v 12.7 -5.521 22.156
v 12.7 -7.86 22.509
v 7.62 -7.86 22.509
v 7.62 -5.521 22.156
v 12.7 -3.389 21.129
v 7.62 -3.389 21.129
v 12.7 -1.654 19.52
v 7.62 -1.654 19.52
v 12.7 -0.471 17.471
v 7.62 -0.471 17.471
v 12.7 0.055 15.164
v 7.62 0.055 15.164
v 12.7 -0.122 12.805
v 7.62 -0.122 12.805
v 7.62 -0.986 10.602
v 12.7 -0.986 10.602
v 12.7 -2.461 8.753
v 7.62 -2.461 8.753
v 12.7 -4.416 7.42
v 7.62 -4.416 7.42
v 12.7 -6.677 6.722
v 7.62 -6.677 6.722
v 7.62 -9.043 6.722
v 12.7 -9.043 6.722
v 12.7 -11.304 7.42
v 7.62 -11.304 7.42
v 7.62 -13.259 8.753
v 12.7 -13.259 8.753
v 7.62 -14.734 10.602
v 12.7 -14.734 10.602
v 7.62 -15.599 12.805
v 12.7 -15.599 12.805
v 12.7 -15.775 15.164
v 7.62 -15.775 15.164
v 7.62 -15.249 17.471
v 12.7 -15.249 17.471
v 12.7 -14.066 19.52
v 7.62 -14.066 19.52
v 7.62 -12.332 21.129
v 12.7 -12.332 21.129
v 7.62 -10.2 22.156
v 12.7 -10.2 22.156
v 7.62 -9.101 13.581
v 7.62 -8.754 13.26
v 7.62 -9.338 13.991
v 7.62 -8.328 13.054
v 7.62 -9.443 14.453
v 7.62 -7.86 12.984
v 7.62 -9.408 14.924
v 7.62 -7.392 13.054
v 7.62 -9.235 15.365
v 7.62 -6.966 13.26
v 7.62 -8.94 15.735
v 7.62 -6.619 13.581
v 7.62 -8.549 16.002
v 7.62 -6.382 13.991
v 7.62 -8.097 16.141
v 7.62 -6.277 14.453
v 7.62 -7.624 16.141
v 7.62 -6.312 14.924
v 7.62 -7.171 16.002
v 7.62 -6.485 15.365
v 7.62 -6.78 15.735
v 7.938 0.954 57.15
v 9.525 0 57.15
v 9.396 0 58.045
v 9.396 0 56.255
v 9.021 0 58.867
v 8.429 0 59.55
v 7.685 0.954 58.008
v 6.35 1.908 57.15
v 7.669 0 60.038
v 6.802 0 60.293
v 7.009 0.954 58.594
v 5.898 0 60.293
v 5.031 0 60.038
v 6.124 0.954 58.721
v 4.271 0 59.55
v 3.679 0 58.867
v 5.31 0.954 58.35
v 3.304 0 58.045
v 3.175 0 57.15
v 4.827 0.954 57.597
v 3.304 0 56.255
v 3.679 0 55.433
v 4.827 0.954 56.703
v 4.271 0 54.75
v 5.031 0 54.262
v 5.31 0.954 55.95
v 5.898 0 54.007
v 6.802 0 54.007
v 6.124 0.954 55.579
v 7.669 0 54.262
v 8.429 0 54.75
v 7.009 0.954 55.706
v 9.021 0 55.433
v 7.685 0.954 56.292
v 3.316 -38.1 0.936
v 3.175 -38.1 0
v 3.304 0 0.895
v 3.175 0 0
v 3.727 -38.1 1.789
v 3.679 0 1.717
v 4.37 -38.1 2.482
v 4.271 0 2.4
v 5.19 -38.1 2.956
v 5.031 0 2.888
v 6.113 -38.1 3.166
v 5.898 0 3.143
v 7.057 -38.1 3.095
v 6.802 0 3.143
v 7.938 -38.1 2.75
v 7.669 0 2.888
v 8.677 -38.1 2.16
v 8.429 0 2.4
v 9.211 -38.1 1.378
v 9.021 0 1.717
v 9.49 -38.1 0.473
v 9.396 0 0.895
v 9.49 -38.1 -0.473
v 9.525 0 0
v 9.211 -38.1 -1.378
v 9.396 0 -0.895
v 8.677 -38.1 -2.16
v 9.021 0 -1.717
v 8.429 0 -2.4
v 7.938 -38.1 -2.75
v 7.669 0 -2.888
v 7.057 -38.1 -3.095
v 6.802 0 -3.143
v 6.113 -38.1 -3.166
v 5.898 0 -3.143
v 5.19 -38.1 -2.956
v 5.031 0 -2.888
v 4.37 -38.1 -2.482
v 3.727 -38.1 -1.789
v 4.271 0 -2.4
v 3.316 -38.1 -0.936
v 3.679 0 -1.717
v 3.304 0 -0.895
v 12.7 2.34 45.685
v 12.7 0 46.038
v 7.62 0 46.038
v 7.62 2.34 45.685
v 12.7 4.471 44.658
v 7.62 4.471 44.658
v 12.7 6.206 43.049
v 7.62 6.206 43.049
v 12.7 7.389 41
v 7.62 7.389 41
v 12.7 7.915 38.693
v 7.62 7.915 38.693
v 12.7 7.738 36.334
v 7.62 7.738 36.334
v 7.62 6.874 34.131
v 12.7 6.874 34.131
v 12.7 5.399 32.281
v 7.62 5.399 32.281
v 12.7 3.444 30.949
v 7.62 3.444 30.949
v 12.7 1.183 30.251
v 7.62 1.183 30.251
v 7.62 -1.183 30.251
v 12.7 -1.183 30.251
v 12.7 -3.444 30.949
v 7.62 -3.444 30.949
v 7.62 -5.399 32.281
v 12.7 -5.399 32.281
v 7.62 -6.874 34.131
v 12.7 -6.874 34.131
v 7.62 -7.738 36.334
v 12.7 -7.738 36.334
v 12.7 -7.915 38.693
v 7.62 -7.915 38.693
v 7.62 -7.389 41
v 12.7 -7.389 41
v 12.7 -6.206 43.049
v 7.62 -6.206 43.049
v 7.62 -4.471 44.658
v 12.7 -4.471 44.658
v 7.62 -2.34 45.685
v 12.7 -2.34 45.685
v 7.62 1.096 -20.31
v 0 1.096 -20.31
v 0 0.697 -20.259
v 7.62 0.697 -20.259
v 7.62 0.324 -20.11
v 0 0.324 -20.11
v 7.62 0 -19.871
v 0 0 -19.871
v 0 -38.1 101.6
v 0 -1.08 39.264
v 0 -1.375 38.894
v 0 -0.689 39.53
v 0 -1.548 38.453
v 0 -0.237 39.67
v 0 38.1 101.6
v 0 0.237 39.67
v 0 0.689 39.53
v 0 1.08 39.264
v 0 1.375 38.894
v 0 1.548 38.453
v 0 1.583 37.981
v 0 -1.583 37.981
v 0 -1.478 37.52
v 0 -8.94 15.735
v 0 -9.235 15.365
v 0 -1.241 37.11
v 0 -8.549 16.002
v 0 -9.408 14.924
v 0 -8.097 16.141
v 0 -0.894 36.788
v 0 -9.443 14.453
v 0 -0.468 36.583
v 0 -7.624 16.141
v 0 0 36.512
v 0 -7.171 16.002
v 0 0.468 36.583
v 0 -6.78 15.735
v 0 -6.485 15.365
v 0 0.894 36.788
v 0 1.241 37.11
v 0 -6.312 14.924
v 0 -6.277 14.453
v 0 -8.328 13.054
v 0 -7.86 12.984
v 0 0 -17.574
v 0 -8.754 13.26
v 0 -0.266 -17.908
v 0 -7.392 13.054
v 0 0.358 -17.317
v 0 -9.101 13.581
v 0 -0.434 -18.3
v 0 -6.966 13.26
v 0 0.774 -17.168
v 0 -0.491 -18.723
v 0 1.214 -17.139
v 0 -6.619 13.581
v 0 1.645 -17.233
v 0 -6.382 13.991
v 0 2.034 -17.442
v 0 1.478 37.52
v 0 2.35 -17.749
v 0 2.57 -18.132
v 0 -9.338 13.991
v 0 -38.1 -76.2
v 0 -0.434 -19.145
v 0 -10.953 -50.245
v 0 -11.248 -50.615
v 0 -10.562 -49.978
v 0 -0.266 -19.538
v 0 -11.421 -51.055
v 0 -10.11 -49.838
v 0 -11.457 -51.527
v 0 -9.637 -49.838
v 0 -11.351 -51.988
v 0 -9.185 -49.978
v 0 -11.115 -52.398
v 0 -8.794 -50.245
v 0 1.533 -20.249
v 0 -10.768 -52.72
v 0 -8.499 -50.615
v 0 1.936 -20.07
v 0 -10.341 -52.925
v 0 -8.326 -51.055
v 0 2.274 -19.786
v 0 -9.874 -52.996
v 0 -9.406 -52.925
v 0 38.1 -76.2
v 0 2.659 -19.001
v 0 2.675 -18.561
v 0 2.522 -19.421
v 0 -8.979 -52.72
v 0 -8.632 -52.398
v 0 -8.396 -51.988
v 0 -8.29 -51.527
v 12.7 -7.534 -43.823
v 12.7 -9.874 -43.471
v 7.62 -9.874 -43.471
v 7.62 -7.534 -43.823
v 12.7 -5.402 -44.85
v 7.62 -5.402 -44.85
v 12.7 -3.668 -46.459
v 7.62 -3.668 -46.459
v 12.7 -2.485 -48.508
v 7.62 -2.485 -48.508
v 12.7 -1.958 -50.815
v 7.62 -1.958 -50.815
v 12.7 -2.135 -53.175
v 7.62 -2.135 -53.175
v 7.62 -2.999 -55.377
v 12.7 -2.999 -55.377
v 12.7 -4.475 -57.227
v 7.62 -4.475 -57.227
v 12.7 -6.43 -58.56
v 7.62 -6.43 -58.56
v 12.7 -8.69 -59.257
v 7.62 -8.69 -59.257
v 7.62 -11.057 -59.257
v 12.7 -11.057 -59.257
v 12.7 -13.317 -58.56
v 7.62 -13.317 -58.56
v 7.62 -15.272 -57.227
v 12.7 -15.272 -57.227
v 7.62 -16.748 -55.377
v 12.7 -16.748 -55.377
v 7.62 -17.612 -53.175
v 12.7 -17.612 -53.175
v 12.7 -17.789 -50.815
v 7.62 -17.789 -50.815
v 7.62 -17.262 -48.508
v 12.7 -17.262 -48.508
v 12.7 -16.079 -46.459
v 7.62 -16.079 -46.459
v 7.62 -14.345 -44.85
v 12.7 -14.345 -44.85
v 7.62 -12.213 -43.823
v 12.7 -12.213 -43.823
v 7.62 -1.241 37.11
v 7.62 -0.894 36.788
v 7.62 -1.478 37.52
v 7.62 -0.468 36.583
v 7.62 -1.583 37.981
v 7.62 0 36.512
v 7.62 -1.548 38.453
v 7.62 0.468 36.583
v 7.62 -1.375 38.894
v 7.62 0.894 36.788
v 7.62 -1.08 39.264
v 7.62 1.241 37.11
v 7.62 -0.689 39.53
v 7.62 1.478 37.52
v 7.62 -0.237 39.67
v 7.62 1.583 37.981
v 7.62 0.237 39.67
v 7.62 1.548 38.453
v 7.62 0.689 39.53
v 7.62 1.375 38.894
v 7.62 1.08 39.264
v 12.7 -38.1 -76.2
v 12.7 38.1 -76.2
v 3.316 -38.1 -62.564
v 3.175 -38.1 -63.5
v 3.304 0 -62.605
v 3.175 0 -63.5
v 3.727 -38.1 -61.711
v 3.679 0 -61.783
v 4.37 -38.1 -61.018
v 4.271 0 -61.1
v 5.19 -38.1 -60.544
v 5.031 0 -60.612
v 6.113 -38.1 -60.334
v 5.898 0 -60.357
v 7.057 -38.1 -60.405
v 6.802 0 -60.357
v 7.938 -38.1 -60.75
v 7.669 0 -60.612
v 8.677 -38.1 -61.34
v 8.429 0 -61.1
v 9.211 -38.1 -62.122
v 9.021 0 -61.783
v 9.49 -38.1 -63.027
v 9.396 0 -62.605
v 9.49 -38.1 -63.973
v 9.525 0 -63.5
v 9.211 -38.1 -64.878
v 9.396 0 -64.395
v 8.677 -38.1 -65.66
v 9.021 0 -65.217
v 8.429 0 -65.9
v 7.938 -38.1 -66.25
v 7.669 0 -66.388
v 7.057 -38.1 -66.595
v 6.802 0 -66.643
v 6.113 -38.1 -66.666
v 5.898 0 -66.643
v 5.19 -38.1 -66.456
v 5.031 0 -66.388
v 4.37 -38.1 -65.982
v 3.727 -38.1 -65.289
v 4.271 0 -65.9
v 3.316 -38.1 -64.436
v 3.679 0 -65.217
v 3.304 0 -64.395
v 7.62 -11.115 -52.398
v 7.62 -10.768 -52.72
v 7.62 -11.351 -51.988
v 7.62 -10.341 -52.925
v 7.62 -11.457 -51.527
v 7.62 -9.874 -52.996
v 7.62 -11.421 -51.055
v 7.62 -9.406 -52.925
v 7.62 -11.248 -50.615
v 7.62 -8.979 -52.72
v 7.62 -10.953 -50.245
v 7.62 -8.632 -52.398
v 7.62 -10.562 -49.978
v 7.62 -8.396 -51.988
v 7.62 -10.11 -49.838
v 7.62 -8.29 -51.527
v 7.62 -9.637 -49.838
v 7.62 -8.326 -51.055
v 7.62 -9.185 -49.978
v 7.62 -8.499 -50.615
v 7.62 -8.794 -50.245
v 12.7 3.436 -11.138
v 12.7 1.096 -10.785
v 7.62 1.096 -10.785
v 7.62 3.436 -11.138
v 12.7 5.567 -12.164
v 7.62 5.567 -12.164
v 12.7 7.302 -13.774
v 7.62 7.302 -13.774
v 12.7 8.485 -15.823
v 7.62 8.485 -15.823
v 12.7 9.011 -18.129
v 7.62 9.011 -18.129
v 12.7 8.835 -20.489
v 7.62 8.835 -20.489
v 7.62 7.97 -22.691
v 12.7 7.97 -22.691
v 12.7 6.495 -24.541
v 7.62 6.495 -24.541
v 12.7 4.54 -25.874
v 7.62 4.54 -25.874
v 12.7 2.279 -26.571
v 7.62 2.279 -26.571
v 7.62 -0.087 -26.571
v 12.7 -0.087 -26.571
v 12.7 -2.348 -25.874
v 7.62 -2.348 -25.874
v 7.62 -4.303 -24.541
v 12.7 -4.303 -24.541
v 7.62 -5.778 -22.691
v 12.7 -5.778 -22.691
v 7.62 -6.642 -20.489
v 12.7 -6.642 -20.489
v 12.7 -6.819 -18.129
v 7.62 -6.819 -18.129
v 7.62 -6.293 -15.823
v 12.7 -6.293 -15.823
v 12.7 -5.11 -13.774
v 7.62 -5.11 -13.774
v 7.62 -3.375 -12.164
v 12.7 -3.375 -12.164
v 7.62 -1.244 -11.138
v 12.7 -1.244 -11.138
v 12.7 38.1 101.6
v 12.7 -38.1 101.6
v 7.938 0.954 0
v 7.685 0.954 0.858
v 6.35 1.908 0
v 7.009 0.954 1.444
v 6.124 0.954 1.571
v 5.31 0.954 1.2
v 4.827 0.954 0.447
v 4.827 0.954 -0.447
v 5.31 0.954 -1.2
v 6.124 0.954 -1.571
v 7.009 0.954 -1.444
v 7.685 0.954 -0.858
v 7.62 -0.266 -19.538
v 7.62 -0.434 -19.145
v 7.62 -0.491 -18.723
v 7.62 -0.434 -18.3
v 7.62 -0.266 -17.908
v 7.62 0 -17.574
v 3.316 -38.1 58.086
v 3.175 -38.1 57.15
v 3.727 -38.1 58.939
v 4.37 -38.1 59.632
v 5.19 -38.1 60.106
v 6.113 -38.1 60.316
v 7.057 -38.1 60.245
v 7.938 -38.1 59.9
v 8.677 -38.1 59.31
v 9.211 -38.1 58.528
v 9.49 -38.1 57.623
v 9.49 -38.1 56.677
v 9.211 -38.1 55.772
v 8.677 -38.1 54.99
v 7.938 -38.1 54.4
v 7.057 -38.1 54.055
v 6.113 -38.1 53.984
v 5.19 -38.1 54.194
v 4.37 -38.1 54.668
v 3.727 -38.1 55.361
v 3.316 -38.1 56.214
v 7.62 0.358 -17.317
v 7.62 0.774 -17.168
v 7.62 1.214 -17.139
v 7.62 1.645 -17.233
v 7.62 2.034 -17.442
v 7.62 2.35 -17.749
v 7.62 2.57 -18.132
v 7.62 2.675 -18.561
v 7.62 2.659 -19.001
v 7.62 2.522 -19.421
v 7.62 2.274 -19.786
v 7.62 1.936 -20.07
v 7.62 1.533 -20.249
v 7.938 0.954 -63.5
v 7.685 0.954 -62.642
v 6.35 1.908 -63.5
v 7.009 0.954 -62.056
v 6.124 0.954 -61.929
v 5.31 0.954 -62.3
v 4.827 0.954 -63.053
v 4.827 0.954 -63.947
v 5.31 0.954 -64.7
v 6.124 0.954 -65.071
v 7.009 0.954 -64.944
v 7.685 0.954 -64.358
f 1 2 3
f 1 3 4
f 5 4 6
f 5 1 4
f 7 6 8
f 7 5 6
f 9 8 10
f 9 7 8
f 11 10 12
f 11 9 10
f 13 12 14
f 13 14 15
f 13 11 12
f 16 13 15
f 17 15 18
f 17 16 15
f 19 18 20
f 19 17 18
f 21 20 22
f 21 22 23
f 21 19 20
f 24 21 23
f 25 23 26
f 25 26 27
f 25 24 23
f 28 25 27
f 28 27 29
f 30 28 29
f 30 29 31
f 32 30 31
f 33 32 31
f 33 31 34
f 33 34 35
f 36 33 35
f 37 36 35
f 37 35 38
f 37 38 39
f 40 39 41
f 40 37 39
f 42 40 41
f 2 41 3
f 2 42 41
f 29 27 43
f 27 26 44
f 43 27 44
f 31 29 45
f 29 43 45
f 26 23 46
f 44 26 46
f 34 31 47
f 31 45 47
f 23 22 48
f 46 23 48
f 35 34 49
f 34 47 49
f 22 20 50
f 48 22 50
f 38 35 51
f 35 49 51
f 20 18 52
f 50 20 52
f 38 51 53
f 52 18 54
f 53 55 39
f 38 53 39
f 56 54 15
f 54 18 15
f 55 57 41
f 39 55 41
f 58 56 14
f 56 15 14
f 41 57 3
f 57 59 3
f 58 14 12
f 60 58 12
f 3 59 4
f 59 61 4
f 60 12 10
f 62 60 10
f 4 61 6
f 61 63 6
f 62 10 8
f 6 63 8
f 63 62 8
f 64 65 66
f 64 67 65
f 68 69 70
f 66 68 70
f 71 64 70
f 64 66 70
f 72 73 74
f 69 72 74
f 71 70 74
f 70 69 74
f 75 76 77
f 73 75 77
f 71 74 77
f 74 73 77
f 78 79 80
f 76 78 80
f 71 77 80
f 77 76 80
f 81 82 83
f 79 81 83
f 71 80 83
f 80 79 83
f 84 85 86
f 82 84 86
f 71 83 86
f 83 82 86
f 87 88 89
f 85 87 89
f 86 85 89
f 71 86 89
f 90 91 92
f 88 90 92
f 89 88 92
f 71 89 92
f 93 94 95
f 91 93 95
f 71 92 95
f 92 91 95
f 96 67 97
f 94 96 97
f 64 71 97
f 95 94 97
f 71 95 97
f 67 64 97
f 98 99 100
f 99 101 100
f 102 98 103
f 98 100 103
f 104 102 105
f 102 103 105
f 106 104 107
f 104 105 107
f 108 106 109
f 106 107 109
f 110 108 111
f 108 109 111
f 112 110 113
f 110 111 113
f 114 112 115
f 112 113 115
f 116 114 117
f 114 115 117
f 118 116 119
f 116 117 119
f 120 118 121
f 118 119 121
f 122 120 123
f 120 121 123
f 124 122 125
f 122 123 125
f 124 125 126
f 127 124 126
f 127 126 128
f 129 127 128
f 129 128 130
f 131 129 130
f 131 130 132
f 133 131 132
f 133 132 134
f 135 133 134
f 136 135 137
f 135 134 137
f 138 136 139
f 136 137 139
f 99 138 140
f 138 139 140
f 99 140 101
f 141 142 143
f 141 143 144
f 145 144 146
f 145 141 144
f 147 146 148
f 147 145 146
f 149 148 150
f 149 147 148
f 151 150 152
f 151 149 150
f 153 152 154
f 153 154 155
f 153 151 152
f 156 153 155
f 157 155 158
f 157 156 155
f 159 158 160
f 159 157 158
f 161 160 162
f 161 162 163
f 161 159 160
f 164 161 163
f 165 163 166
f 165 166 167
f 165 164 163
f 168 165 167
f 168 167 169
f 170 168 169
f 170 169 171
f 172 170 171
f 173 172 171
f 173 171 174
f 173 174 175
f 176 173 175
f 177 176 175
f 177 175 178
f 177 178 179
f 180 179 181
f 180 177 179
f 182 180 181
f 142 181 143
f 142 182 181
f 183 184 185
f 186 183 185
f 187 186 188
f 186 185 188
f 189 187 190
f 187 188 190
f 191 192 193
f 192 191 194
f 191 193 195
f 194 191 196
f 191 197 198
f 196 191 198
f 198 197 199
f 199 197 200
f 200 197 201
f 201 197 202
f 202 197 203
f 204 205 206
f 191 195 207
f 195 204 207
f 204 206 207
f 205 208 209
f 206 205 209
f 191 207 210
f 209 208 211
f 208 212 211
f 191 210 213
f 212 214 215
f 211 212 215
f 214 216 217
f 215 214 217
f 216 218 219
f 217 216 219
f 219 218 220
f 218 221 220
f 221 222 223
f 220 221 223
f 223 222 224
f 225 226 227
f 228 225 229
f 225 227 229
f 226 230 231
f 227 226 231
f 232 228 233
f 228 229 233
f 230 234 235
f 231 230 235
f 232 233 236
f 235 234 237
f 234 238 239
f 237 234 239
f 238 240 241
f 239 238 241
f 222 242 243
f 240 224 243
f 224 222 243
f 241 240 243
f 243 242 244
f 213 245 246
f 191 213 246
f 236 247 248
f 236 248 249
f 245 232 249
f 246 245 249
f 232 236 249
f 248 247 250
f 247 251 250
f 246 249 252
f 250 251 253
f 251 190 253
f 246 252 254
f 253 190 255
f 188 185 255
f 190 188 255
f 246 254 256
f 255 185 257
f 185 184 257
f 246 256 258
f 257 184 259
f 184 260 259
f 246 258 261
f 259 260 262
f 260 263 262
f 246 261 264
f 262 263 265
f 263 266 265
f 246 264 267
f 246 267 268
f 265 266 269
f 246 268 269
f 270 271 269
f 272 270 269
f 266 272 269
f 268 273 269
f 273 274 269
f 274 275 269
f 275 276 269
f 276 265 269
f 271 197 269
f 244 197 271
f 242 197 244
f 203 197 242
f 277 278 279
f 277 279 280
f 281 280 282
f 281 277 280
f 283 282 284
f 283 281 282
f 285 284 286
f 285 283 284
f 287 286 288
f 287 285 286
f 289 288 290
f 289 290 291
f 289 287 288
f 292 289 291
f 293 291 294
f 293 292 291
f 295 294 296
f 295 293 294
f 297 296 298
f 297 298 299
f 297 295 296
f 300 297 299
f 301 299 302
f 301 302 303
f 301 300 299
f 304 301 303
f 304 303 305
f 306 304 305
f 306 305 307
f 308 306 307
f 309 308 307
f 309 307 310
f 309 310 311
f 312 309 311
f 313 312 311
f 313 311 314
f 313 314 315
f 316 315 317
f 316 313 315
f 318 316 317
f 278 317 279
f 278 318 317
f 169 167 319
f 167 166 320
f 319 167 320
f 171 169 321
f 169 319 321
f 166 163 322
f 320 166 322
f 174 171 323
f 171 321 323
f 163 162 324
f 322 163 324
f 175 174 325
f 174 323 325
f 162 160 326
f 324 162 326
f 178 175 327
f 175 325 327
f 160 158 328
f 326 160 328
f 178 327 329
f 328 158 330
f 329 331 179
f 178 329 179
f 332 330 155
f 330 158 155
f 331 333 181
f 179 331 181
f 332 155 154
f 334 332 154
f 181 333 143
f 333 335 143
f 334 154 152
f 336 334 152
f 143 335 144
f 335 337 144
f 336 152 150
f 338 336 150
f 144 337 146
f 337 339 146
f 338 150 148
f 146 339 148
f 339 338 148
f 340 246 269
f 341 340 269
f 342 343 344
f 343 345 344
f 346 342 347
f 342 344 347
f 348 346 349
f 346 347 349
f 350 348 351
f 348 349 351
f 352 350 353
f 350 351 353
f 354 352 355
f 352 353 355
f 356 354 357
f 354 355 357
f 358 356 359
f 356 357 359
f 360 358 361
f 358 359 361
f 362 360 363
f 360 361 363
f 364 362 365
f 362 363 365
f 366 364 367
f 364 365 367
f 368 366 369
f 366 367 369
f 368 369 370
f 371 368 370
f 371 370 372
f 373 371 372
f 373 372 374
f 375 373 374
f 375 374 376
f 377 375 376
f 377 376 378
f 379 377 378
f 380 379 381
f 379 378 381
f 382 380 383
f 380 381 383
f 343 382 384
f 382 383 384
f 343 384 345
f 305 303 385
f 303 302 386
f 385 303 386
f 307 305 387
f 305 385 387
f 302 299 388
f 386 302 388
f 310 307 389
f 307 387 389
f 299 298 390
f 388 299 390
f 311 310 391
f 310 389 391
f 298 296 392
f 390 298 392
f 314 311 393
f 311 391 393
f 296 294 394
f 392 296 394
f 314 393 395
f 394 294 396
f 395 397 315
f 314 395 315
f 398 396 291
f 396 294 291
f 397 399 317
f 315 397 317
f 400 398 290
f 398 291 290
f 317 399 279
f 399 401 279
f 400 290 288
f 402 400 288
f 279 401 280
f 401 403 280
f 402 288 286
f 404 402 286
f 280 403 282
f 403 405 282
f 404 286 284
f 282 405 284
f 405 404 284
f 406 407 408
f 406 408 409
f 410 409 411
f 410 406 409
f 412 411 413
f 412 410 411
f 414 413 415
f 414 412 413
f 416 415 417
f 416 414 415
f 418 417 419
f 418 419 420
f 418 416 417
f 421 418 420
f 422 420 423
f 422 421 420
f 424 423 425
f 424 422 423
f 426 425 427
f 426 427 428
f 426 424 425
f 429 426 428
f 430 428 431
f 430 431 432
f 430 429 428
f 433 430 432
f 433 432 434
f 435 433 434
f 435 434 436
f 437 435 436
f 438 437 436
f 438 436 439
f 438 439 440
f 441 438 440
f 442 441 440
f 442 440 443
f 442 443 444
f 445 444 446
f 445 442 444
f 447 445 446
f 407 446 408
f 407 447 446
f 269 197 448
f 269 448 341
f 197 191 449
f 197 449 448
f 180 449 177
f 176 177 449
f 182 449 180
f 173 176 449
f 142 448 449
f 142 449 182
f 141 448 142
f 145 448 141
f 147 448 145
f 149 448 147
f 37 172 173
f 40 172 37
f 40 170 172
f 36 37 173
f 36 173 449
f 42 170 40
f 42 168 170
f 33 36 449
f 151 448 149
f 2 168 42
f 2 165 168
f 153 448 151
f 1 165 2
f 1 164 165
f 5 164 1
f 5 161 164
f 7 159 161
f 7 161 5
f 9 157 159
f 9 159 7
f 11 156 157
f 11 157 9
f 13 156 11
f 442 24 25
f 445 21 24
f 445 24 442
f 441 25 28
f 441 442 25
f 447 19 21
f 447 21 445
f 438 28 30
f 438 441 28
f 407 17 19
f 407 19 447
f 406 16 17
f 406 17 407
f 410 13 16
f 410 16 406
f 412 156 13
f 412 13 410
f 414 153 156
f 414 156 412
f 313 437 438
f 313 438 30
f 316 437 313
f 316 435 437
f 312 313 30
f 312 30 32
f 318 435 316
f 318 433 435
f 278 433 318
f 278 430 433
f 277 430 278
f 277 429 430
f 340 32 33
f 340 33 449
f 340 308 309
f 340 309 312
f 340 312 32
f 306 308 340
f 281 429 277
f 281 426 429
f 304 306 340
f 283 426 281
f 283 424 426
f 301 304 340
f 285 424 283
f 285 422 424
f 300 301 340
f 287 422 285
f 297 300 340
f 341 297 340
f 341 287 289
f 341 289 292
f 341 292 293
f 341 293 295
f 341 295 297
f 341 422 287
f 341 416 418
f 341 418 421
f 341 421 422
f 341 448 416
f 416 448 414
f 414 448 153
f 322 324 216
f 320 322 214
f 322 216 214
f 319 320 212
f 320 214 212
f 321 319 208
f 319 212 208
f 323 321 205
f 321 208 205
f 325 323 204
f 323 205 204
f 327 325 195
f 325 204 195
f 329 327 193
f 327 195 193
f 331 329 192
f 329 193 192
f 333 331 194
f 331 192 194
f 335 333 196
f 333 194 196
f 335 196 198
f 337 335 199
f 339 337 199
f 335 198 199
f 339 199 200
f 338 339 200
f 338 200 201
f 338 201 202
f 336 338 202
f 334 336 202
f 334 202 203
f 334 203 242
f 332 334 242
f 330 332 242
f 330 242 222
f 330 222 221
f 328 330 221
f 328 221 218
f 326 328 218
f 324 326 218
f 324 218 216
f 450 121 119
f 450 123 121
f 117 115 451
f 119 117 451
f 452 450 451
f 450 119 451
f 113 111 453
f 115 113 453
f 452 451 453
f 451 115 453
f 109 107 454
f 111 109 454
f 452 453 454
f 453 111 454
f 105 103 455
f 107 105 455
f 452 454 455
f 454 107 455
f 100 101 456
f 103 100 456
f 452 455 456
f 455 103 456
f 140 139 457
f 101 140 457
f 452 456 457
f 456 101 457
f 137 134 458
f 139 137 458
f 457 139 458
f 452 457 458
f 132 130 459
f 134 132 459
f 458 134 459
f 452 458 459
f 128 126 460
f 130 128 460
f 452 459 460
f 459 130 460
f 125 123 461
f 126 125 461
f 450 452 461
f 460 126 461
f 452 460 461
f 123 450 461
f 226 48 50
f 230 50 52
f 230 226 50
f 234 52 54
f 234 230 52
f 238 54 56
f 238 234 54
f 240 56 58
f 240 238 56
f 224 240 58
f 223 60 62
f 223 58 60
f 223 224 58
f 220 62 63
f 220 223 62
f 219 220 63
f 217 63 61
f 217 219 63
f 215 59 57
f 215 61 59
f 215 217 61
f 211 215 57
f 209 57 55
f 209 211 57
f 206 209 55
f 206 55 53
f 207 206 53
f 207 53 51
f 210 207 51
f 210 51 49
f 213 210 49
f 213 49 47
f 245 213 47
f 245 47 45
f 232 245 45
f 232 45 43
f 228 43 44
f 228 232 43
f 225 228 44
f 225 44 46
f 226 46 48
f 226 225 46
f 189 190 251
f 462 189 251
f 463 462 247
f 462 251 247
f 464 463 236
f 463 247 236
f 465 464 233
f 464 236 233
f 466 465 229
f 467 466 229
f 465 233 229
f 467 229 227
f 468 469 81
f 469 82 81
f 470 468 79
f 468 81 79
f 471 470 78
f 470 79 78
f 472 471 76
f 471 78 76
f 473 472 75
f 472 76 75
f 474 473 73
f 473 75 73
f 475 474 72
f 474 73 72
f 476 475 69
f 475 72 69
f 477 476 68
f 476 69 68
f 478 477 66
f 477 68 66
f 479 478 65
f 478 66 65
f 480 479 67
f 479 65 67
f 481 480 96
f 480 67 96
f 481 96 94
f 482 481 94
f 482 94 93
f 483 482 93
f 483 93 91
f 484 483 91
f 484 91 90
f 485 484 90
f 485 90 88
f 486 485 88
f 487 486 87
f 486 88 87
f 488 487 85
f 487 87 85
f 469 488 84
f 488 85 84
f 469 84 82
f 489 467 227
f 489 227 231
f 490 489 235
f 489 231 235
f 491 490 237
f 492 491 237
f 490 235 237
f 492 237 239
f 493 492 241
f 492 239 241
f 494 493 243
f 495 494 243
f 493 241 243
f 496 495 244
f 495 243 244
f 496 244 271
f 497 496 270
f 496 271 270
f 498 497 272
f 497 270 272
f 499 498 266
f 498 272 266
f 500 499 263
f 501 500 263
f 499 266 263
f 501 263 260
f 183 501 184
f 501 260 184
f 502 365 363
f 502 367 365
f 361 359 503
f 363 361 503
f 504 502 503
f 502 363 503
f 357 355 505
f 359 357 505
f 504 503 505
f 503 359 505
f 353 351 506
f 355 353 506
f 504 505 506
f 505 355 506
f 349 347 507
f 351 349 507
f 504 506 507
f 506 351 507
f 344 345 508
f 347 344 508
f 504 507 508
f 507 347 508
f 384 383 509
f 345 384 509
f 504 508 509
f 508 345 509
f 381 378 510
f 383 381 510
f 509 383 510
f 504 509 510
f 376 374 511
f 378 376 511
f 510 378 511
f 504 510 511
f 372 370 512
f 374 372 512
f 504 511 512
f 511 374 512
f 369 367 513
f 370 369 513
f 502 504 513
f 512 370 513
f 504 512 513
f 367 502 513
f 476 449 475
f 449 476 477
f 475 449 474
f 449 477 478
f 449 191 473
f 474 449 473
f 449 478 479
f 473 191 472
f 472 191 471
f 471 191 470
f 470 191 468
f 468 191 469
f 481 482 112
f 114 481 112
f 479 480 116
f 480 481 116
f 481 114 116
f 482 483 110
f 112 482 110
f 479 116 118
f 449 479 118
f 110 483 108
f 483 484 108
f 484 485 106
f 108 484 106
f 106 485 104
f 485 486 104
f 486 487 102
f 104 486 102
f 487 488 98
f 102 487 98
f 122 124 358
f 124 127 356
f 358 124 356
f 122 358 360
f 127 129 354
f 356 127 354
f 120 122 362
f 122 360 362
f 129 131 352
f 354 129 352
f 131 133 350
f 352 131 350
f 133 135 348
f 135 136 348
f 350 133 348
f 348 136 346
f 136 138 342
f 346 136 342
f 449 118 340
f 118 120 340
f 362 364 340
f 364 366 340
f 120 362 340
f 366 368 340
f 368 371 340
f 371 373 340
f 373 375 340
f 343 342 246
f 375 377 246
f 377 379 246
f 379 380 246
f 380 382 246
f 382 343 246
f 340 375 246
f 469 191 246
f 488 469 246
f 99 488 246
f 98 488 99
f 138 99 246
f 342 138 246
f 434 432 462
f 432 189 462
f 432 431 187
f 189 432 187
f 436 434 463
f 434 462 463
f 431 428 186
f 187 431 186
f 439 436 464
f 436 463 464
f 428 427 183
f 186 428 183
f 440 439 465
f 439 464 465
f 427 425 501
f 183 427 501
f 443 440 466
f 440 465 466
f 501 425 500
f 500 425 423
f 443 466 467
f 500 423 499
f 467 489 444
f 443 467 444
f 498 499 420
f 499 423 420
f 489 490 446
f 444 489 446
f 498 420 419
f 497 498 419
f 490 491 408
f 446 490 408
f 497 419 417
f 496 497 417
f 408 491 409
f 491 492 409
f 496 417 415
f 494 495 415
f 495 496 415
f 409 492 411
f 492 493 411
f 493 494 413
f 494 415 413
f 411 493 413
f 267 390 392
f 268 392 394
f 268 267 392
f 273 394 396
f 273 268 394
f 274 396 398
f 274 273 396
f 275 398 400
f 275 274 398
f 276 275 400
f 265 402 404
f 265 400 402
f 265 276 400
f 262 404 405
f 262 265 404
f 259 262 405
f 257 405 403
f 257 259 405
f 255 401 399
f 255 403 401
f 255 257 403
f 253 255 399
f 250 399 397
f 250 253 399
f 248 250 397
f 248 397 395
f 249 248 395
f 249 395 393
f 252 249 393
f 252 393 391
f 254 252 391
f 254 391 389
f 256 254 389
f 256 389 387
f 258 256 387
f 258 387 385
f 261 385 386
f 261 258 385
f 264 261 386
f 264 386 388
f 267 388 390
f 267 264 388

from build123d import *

# Parameters (mm, degrees)
SKETCH1_W                       = 177.8
SKETCH1_H                       = 76.2
SKETCH1_R                       = 1.5875
BOSS_EXTRUDE1_DEPTH             = 12.7
SKETCH2_R                       = 7.9375
CUT_EXTRUDE1_DEPTH              = 5.08
F_1_4_0_25_DIAMETER_HOLE1_D     = 6.35
F_1_4_0_25_DIAMETER_HOLE1_DEPTH = 38.1
F_1_4_0_25_DIAMETER_HOLE1_TIP   = 1.907732465


with BuildPart() as part:
    # Sketch1 → Boss-Extrude1 (new body)
    with BuildSketch(Plane(origin=(0, 0, 0), x_dir=(0, 0, -1), z_dir=(1, 0, 0))):
        with Locations((-12.7, 0)):
            Rectangle(SKETCH1_W, SKETCH1_H)
        with Locations((18.72253158, 1.096077429)):
            Circle(SKETCH1_R, mode=Mode.SUBTRACT)
        with Locations((-38.1, 0)):
            Circle(SKETCH1_R, mode=Mode.SUBTRACT)
        with Locations((-14.571224015, -7.860160654)):
            Circle(SKETCH1_R, mode=Mode.SUBTRACT)
        with Locations((51.408255992, -9.873506971)):
            Circle(SKETCH1_R, mode=Mode.SUBTRACT)
    extrude(amount=BOSS_EXTRUDE1_DEPTH)

    # Sketch2 → Cut-Extrude1 (cut)
    with BuildSketch(Plane.ZY.offset(-12.7)):
        with Locations((38.1, 0)):
            Circle(SKETCH2_R)
        with Locations((14.571224015, -7.860160654)):
            Circle(SKETCH2_R)
        with Locations((-18.72253158, 1.096077429)):
            Circle(SKETCH2_R)
        with Locations((-51.408255992, -9.873506971)):
            Circle(SKETCH2_R)
    extrude(amount=CUT_EXTRUDE1_DEPTH, mode=Mode.SUBTRACT)

    # 1/4 (0.25) Diameter Hole1
    with Locations(Plane.XZ.offset(38.1)):
        with Locations((6.35, -63.5), (6.35, 0), (6.35, 57.15)):
            Hole(F_1_4_0_25_DIAMETER_HOLE1_D / 2, depth=F_1_4_0_25_DIAMETER_HOLE1_DEPTH)
            with Locations((0, 0, -(F_1_4_0_25_DIAMETER_HOLE1_DEPTH + F_1_4_0_25_DIAMETER_HOLE1_TIP / 2))):  # 118° drill point
                Cone(0, F_1_4_0_25_DIAMETER_HOLE1_D / 2, F_1_4_0_25_DIAMETER_HOLE1_TIP, mode=Mode.SUBTRACT)


solid = part.part
